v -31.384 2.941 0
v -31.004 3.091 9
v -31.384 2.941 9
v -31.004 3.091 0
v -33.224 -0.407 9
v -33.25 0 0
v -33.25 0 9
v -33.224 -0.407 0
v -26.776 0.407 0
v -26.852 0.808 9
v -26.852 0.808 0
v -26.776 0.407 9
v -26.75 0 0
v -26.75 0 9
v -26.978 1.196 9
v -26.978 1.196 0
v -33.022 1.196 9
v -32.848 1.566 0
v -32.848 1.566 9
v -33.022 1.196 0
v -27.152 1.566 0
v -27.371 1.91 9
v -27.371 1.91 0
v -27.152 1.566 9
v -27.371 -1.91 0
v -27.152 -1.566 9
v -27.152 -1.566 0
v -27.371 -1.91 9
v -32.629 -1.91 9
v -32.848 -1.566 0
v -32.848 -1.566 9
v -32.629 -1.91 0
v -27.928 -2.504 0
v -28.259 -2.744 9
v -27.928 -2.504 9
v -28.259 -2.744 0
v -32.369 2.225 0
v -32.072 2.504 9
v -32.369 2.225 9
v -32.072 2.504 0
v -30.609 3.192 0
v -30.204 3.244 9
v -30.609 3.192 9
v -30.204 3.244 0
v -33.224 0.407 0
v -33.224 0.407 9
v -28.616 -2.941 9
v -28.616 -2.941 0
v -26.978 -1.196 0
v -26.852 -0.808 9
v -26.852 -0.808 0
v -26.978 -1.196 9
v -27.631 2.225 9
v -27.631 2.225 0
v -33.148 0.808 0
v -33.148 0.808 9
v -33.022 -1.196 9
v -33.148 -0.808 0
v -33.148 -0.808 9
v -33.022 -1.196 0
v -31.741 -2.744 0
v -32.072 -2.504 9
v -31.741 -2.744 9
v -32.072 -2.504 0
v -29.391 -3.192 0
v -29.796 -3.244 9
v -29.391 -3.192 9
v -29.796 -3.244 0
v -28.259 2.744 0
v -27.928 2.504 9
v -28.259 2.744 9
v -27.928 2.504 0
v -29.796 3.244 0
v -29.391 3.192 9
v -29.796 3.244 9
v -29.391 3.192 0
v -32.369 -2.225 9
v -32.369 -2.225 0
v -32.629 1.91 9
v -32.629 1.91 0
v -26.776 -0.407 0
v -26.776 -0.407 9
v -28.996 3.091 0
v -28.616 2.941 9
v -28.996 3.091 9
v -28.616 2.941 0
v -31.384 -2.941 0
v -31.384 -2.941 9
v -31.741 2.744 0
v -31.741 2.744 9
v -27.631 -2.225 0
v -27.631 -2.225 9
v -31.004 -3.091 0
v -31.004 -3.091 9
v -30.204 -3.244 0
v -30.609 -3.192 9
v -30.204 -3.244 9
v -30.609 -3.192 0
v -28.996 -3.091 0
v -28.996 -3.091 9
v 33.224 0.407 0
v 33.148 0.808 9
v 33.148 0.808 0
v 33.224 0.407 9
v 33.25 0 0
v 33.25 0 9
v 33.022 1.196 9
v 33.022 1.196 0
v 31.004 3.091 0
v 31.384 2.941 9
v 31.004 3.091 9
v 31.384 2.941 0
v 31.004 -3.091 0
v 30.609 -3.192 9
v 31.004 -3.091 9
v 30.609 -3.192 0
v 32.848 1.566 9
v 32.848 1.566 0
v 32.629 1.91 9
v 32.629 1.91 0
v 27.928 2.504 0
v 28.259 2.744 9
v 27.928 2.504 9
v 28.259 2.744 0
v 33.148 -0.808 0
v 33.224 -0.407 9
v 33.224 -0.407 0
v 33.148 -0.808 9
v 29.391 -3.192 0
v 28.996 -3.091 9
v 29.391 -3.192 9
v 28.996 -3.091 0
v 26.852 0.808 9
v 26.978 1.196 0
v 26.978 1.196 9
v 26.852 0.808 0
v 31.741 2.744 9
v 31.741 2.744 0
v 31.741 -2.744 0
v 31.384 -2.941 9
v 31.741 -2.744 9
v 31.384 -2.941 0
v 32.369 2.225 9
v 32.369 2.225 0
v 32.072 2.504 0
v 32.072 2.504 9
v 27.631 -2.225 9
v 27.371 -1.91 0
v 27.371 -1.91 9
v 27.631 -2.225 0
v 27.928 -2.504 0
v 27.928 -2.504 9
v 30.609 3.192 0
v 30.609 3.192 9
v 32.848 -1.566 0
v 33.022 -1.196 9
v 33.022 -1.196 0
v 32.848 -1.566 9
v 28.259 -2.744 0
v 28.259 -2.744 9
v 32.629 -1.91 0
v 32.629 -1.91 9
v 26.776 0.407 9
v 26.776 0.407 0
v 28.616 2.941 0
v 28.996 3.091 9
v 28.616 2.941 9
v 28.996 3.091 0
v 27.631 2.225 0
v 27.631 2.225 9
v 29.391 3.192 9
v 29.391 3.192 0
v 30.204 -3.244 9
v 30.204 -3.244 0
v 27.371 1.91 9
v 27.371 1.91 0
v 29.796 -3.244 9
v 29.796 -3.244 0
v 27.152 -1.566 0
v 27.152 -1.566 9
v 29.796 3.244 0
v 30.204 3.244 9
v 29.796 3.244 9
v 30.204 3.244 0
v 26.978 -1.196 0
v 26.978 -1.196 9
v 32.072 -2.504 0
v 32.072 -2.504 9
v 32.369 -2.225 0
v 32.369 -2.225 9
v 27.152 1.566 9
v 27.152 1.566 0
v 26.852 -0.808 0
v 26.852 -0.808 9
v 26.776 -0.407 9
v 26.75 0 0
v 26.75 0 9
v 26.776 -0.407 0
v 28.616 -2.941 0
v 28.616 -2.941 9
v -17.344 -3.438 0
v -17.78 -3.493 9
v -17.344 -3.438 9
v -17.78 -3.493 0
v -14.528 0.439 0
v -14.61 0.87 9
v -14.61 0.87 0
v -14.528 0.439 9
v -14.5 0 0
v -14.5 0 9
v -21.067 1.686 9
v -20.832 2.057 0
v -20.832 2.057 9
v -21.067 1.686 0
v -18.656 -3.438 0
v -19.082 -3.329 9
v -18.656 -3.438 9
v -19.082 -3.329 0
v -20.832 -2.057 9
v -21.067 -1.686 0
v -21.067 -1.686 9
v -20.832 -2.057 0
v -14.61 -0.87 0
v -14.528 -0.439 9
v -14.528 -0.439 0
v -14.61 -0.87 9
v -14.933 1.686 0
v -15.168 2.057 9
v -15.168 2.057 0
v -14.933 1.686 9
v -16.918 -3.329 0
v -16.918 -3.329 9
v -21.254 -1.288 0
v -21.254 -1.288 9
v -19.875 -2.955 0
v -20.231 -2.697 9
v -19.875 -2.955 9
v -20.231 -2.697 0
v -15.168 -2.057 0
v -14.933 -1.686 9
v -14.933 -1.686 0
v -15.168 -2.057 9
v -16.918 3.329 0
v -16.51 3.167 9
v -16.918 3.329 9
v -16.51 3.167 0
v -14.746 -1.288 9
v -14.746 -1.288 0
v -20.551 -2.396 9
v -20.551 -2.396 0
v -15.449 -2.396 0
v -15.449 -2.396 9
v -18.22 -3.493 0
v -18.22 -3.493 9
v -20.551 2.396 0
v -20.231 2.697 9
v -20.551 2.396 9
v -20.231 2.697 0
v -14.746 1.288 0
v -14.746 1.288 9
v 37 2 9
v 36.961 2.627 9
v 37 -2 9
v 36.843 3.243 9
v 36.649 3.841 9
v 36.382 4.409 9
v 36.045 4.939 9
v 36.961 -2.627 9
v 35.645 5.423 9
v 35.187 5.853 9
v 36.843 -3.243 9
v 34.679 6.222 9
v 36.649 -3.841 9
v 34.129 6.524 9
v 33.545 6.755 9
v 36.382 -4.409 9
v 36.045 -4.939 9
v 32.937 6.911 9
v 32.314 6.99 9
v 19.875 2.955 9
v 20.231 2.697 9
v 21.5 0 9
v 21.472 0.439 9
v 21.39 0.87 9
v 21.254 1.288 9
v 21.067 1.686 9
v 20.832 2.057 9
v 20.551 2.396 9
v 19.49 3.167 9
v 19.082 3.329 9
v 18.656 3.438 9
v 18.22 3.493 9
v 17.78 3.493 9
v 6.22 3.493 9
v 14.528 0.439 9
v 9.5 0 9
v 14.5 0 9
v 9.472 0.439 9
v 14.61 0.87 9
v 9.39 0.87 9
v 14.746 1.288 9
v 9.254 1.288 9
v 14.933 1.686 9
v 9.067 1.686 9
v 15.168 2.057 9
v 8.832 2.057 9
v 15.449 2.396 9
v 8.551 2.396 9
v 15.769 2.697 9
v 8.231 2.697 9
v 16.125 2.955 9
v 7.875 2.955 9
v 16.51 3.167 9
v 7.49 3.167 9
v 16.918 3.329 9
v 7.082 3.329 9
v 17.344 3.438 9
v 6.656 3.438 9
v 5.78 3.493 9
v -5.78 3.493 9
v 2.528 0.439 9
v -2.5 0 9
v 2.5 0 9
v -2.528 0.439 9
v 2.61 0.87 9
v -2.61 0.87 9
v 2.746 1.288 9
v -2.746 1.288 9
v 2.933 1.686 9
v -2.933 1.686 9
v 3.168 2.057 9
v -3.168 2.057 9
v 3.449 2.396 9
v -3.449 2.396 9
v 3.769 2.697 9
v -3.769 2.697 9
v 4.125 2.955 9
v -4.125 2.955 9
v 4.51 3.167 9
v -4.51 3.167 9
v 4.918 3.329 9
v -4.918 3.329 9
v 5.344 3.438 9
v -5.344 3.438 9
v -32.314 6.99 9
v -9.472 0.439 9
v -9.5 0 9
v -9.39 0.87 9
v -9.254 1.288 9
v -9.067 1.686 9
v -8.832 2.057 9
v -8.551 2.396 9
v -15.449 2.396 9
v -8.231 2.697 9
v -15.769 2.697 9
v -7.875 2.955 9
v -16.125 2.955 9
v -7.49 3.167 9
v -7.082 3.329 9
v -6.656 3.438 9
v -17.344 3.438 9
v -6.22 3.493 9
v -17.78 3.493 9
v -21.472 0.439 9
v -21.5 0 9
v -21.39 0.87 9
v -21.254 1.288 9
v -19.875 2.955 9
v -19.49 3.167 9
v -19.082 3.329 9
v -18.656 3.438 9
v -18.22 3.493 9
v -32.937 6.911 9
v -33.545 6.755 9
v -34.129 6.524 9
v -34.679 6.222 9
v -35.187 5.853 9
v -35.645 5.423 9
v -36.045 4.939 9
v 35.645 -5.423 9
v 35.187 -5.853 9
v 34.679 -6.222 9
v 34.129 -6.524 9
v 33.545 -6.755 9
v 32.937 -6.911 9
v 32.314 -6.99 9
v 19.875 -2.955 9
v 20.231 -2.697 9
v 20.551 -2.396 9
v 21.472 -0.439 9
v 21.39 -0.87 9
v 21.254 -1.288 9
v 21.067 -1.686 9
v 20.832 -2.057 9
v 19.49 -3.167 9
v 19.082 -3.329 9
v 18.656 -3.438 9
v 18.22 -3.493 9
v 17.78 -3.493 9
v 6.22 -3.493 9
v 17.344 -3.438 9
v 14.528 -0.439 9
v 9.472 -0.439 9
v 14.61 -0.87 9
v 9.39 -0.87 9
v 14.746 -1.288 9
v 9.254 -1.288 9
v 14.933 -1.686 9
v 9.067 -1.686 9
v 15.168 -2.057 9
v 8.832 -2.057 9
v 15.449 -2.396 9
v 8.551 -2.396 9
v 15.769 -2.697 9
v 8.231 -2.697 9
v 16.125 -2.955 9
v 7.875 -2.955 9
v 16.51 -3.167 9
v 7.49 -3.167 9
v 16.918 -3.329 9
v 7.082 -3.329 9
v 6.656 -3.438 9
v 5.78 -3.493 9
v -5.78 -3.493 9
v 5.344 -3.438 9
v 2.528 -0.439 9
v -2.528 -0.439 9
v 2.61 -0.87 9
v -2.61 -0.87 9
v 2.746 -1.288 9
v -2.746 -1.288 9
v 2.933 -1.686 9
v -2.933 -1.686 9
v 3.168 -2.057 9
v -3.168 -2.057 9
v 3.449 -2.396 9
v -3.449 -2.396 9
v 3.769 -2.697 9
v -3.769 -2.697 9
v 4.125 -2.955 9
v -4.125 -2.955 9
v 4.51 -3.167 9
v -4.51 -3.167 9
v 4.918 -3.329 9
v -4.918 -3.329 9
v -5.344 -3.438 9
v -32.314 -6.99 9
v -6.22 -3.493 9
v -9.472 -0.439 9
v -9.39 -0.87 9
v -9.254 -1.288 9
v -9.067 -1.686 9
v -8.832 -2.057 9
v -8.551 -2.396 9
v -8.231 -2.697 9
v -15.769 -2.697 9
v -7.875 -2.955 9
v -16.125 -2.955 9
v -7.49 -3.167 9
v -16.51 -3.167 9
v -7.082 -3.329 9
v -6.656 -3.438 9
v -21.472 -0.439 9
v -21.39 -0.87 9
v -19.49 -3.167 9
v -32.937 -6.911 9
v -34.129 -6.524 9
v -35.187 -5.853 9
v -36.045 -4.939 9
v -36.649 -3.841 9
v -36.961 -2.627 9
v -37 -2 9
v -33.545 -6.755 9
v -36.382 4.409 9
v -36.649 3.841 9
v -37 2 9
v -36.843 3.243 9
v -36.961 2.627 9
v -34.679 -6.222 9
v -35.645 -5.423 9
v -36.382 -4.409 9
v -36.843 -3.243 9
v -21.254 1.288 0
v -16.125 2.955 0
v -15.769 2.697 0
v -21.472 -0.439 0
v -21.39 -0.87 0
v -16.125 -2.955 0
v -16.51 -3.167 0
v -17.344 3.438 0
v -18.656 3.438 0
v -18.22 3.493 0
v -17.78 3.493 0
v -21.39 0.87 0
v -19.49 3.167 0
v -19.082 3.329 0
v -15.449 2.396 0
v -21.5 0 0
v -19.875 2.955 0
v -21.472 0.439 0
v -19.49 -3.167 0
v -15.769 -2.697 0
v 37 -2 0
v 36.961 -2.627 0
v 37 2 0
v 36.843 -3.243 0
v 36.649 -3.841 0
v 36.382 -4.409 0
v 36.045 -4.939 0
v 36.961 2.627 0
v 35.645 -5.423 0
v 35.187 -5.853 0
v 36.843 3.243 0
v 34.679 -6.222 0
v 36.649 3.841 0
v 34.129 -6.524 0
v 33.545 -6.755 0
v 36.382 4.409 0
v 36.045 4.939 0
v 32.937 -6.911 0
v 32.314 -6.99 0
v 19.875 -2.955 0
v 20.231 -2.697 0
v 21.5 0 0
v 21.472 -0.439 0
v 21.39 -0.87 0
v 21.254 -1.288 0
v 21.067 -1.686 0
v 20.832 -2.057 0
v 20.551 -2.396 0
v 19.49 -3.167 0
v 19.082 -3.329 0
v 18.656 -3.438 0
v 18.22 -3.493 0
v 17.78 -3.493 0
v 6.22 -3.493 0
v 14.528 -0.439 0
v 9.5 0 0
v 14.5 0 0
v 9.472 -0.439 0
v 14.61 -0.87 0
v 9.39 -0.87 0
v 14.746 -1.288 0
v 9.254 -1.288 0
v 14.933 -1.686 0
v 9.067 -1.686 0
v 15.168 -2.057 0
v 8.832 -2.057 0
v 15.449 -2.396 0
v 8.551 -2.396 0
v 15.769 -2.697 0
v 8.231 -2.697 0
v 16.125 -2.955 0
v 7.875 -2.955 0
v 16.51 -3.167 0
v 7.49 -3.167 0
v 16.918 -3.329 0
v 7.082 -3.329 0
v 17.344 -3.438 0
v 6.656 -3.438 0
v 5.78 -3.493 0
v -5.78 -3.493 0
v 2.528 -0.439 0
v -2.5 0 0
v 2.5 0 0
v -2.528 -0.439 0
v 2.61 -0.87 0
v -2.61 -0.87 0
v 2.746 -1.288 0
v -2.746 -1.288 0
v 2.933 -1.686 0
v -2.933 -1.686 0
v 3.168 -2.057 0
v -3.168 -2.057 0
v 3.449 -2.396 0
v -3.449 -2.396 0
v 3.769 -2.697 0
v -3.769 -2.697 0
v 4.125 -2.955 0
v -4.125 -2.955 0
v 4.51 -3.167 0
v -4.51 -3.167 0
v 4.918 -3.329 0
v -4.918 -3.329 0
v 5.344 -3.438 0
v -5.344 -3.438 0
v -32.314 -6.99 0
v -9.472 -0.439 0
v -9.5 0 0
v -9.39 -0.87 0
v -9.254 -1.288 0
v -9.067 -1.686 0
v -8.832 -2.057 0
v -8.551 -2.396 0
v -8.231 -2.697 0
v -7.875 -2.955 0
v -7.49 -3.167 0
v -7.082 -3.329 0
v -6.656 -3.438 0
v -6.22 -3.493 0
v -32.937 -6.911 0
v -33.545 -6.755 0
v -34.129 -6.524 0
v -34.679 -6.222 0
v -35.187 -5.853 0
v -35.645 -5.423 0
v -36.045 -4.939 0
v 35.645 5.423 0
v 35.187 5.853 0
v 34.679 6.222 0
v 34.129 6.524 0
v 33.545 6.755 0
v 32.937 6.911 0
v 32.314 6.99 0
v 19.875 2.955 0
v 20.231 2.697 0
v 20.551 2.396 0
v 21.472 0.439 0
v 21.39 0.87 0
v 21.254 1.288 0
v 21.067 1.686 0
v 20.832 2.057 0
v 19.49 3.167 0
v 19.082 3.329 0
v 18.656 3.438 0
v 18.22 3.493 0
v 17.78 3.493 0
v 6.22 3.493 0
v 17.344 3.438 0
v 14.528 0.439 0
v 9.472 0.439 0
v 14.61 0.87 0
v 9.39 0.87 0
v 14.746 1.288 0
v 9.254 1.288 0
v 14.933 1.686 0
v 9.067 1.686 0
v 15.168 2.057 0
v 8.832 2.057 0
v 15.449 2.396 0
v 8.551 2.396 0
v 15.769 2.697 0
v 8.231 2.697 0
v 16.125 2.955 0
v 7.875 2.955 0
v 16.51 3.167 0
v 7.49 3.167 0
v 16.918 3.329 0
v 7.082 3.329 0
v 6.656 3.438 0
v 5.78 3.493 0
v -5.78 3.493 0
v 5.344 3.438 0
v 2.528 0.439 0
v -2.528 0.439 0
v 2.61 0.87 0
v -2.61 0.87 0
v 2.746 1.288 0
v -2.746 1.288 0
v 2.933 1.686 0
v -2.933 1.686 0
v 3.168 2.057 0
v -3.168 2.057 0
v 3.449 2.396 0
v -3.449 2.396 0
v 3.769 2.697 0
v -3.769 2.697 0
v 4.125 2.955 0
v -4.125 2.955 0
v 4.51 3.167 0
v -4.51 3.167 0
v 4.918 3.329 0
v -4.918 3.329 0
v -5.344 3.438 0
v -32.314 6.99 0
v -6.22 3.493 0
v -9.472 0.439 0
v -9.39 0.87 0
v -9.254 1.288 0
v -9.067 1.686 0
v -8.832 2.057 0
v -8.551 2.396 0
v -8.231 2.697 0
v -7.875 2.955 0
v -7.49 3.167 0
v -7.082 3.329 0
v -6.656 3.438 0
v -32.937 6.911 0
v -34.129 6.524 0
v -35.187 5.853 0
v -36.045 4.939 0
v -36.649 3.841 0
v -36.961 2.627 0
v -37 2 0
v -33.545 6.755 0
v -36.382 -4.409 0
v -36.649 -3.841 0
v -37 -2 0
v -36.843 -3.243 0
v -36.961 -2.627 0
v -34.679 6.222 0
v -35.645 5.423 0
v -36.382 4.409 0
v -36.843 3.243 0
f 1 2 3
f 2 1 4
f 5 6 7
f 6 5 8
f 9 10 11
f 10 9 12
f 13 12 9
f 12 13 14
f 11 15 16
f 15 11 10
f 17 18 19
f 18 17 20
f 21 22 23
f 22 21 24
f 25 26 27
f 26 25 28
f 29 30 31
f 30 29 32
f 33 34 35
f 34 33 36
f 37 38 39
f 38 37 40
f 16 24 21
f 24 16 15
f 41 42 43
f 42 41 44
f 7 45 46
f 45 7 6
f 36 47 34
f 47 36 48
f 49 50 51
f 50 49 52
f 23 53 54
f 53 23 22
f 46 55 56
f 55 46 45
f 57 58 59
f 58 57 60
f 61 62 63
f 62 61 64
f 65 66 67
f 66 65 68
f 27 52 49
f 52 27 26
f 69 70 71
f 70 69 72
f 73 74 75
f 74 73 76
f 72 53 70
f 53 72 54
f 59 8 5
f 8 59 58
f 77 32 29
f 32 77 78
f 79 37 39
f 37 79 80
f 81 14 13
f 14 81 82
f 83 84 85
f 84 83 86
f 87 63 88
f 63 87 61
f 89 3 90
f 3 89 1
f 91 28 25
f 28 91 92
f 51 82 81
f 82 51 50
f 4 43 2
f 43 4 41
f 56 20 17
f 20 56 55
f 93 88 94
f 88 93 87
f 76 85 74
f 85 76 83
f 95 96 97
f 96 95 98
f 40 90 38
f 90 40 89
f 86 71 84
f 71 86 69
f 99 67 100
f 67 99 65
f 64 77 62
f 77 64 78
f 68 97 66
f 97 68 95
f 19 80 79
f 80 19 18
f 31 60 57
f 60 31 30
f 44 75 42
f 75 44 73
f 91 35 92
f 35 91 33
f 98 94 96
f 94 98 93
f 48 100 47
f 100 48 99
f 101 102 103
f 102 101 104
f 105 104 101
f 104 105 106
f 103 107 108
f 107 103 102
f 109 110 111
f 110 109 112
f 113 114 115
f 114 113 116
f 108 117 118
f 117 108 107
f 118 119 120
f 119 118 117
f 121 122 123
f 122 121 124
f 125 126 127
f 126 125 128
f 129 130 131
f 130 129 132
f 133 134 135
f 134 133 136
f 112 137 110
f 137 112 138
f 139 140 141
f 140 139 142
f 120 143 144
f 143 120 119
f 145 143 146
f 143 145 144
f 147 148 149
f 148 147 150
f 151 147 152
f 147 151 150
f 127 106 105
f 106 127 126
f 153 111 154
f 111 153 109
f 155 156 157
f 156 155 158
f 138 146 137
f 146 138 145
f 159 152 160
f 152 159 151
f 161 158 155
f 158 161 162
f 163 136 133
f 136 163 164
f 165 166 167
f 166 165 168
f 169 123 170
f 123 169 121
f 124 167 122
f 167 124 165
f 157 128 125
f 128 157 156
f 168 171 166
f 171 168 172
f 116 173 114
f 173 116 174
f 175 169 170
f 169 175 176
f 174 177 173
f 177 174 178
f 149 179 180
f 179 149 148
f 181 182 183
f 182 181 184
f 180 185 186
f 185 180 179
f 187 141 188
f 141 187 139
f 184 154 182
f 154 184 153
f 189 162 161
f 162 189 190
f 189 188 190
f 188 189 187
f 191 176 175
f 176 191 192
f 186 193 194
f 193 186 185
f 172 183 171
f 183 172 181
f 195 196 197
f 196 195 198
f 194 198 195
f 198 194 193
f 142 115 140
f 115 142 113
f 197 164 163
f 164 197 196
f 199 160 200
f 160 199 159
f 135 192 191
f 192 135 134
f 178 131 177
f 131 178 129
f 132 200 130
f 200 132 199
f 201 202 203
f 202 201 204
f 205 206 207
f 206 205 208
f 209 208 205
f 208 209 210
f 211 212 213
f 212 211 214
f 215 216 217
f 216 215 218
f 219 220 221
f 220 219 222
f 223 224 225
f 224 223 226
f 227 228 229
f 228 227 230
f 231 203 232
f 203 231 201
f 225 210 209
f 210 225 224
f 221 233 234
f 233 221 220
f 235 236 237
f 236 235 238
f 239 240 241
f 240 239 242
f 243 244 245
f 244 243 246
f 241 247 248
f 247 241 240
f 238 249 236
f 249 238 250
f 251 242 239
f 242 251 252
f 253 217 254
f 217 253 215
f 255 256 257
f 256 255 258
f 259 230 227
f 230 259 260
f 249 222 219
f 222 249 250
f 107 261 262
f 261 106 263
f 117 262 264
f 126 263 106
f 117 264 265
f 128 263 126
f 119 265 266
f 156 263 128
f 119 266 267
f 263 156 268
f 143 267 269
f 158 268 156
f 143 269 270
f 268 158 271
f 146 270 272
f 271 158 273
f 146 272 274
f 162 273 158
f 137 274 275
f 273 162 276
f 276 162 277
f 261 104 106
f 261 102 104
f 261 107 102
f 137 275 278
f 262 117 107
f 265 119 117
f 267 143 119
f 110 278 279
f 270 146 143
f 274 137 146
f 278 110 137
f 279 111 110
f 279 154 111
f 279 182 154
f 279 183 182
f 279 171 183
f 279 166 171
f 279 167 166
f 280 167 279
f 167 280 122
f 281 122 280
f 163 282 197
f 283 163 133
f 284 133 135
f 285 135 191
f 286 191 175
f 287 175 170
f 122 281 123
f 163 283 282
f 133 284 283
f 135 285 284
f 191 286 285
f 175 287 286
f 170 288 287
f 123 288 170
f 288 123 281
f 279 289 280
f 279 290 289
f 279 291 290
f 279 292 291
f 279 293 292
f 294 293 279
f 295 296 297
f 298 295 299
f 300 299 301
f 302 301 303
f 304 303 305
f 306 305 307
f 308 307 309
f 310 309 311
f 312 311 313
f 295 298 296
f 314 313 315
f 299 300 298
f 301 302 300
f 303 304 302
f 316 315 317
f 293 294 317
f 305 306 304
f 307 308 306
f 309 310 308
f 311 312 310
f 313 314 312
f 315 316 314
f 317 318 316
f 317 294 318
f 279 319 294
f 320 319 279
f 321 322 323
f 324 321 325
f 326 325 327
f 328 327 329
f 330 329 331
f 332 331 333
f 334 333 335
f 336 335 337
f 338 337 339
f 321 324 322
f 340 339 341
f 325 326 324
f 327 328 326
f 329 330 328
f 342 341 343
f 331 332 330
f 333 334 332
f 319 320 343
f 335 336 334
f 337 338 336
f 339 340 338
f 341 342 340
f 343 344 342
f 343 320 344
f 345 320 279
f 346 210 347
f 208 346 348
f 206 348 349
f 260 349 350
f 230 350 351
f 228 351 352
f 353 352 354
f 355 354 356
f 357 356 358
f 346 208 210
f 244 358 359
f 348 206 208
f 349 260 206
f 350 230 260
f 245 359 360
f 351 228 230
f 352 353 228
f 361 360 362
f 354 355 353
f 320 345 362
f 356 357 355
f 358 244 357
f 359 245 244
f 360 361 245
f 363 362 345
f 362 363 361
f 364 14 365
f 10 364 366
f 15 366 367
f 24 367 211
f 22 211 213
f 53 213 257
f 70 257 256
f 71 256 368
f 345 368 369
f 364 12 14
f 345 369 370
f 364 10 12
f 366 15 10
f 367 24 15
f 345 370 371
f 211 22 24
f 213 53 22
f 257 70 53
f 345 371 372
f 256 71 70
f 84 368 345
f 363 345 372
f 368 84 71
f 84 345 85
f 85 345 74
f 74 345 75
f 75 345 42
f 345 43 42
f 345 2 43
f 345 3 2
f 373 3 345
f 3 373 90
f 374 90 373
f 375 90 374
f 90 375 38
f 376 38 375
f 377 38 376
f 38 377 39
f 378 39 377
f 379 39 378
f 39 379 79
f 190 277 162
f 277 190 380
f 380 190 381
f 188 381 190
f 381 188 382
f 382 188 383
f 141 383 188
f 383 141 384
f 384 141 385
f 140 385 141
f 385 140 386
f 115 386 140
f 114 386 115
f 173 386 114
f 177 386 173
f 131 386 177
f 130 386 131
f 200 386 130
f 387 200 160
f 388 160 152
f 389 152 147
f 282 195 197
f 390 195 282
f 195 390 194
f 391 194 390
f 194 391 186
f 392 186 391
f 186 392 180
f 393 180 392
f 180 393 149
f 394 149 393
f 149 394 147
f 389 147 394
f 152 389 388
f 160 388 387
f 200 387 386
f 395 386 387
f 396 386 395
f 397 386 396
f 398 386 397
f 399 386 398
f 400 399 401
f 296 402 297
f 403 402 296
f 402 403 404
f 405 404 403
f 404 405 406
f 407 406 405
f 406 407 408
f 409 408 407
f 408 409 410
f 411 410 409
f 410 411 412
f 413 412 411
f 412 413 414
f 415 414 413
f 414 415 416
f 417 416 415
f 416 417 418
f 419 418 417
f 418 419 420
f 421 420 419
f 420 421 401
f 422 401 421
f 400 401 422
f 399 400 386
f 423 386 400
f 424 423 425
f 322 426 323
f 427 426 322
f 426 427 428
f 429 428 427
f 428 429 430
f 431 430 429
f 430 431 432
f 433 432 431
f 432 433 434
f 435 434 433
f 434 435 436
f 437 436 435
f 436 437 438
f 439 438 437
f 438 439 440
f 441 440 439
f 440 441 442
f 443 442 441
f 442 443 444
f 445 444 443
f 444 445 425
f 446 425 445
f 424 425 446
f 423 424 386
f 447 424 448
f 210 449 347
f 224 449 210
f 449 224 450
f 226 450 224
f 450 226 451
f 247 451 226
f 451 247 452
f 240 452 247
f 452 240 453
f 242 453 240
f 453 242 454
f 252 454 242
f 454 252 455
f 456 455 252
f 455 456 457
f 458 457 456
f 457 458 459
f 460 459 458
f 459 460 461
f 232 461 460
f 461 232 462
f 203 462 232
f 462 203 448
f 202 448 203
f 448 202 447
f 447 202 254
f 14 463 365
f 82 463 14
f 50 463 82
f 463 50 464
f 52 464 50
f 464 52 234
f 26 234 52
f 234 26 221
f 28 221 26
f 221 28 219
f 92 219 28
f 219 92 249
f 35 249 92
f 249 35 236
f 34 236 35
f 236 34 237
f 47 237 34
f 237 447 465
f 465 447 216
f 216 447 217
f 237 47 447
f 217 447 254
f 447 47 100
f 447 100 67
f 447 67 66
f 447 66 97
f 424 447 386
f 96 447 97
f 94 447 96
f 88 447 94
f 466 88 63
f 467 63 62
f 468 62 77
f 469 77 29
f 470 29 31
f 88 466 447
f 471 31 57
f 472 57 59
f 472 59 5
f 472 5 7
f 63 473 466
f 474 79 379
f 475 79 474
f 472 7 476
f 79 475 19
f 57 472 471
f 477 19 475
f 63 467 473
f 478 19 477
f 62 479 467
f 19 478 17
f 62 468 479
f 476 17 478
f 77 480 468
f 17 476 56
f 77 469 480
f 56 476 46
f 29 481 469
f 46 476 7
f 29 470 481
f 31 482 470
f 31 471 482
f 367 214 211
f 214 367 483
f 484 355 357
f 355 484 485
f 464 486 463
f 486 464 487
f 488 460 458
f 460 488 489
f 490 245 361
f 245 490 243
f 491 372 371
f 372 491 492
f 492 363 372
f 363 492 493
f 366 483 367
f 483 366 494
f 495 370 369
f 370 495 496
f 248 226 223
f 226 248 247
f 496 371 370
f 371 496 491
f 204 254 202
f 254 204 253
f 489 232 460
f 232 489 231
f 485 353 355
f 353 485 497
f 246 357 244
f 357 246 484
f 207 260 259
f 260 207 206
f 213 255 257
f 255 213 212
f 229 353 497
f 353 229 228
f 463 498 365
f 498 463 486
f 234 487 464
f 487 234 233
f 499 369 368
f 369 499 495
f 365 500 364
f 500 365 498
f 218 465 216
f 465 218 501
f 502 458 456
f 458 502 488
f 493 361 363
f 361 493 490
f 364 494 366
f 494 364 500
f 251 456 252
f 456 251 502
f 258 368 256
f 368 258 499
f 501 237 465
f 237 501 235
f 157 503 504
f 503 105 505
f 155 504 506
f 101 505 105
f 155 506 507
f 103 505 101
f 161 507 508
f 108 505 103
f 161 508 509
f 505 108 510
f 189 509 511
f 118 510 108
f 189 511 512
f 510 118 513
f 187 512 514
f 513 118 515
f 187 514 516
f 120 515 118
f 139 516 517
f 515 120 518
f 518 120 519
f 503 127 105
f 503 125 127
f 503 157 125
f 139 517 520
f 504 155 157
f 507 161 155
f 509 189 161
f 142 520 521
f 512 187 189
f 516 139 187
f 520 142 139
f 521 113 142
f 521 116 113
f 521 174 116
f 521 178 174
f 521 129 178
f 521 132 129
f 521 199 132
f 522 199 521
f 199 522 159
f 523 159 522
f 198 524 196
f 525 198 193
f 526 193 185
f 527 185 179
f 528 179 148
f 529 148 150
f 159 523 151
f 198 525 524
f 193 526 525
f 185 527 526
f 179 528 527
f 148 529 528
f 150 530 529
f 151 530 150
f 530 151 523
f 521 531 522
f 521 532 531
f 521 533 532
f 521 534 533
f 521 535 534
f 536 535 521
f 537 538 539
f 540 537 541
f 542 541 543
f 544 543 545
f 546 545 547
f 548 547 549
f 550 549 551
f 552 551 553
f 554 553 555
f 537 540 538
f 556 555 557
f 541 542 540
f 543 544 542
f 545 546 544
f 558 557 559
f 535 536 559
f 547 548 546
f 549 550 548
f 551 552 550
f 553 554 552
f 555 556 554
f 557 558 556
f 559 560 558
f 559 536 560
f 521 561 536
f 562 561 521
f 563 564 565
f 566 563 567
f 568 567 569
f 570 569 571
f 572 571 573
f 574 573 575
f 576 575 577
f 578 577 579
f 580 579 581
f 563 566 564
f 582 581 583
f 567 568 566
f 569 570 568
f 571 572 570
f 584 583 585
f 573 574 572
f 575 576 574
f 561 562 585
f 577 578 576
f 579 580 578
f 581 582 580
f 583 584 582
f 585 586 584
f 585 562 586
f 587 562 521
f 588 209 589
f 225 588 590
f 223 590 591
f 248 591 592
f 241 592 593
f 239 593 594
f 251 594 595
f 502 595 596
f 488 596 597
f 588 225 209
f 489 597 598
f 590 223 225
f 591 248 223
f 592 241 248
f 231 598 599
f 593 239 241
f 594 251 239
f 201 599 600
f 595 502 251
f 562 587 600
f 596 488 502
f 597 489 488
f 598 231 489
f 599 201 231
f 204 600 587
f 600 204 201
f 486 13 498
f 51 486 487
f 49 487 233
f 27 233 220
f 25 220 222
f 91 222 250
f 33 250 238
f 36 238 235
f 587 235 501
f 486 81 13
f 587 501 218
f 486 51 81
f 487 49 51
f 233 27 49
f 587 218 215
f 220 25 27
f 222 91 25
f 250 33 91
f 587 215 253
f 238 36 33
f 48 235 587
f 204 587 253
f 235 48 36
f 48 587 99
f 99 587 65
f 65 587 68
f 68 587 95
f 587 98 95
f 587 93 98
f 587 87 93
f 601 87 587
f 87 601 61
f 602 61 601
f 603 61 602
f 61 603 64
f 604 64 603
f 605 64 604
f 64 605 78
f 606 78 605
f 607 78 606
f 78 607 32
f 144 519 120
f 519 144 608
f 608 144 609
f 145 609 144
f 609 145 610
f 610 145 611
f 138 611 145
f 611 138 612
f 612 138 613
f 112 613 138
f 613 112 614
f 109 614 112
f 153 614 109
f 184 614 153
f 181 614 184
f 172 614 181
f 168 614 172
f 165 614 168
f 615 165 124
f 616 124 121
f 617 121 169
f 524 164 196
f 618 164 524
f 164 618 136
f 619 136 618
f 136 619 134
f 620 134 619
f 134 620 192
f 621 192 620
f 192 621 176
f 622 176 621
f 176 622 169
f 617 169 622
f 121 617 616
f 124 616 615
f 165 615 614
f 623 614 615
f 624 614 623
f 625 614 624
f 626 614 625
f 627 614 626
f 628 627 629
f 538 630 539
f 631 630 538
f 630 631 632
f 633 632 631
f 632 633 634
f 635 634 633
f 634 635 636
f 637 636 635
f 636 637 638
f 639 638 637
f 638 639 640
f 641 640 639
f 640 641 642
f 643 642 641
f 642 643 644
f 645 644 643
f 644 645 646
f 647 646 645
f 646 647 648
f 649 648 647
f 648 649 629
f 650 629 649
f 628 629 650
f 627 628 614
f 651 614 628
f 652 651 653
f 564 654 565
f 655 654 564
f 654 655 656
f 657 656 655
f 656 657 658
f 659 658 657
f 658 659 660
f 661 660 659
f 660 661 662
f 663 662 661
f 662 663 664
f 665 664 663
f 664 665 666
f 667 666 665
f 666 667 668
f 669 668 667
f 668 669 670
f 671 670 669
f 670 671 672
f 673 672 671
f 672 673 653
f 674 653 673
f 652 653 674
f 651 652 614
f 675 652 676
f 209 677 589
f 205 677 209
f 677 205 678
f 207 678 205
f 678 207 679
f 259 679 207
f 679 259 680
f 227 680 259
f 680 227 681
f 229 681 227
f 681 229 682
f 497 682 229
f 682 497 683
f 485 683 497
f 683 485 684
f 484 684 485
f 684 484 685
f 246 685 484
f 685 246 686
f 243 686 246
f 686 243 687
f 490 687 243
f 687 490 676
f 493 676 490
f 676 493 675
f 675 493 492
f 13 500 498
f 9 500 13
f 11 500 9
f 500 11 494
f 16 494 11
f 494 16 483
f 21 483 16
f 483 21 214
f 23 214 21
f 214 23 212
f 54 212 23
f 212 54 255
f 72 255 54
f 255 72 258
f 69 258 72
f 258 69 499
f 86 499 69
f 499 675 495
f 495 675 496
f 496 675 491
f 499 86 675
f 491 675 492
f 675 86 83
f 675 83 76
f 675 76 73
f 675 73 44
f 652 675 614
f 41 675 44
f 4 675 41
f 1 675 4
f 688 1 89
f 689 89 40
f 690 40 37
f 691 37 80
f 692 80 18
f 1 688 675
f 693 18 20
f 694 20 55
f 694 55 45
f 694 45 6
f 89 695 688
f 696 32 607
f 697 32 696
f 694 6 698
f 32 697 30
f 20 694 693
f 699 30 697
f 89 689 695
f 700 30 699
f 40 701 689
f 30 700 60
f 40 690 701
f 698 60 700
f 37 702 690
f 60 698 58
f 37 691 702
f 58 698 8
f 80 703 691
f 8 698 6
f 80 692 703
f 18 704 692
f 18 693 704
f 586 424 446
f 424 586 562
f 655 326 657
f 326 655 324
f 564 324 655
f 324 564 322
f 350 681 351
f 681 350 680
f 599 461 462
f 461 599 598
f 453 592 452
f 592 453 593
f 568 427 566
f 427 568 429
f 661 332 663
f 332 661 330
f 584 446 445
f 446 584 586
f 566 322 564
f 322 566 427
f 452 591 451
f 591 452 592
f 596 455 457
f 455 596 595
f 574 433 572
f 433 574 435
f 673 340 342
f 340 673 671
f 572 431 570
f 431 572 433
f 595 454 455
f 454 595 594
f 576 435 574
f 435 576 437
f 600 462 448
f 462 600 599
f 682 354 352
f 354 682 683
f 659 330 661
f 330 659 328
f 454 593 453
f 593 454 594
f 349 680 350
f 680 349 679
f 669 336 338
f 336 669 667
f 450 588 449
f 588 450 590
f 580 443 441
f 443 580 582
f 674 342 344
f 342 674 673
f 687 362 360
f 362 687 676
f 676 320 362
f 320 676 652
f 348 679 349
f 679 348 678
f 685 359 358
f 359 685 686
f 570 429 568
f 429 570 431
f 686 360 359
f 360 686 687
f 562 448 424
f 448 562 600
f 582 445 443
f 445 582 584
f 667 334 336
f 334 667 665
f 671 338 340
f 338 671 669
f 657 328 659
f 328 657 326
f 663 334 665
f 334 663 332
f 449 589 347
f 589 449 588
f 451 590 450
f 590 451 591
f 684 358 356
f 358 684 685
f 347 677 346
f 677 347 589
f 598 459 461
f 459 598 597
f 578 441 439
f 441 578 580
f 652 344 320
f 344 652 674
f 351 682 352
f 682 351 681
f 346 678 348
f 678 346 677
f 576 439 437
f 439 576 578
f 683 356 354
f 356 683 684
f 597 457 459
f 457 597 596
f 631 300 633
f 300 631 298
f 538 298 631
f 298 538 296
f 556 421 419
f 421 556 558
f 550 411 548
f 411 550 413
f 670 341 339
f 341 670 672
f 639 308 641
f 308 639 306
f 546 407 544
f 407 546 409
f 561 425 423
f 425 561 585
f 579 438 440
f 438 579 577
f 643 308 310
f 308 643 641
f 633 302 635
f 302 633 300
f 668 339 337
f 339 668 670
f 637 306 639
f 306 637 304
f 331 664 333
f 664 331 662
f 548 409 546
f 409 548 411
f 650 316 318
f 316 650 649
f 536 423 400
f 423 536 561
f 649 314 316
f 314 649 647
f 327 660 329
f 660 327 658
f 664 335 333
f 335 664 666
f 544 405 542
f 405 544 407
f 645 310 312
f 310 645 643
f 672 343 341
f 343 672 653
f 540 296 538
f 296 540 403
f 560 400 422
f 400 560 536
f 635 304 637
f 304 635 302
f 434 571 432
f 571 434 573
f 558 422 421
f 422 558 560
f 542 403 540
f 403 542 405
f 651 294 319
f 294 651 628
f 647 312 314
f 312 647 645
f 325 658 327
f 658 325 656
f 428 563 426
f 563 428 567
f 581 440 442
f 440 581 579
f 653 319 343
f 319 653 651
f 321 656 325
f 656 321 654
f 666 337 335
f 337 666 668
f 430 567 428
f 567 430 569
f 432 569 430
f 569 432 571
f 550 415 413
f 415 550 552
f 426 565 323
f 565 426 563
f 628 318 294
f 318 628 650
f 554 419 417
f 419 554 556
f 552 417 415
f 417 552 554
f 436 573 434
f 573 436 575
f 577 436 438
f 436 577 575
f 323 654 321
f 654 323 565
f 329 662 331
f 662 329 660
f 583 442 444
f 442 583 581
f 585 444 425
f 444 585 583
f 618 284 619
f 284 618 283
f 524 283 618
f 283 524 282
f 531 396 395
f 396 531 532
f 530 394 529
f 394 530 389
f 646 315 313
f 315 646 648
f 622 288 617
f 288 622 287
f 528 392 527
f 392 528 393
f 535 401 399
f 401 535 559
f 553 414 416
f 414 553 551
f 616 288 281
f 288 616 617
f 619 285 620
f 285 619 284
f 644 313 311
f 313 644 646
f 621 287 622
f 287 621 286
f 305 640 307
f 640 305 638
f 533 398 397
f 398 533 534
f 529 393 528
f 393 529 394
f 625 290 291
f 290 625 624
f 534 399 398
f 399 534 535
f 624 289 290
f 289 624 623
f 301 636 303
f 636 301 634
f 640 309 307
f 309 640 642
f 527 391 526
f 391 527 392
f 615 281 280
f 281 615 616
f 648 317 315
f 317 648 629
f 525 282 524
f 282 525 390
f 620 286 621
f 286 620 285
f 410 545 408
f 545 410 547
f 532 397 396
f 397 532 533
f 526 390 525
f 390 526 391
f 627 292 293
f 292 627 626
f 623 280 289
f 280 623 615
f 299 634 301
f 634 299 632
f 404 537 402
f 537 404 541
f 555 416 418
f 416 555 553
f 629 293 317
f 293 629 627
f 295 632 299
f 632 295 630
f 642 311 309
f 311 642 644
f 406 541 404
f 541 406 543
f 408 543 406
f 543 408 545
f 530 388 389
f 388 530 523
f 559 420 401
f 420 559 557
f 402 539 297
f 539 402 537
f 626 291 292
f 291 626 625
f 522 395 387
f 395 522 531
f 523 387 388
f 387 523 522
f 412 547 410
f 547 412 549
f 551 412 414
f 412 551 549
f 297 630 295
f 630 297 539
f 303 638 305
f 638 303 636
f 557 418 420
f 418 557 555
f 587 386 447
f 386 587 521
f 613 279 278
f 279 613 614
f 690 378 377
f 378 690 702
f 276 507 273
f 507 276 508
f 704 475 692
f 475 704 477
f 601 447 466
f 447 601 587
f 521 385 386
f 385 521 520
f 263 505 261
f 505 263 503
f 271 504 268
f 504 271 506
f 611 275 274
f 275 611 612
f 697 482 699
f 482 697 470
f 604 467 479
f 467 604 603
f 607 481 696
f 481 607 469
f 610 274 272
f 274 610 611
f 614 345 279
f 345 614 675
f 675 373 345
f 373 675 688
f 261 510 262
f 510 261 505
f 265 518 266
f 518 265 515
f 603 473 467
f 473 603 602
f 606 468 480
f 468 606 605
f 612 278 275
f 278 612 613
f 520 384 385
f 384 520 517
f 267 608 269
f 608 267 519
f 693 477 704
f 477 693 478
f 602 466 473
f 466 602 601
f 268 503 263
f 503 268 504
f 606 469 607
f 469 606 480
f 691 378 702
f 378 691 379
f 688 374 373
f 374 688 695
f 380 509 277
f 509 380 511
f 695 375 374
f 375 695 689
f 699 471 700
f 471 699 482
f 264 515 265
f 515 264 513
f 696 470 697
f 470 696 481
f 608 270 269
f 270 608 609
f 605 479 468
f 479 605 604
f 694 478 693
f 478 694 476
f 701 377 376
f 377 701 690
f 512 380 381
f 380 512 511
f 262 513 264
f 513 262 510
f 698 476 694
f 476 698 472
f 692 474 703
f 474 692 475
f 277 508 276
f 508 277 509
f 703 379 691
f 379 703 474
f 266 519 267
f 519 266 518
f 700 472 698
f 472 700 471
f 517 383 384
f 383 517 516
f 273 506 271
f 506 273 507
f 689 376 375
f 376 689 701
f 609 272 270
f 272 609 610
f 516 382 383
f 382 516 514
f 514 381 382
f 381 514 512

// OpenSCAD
$fn = 50;


difference() {
	union() {
		hull() {
			translate(v = [-32.0000000000, 2.0000000000, 0]) {
				cylinder(h = 9, r = 5);
			}
			translate(v = [32.0000000000, 2.0000000000, 0]) {
				cylinder(h = 9, r = 5);
			}
			translate(v = [-32.0000000000, -2.0000000000, 0]) {
				cylinder(h = 9, r = 5);
			}
			translate(v = [32.0000000000, -2.0000000000, 0]) {
				cylinder(h = 9, r = 5);
			}
		}
	}
	union() {
		#translate(v = [-30.0000000000, 0.0000000000, 0]) {
			cylinder(h = 9, r = 3.2500000000);
		}
		#translate(v = [30.0000000000, 0.0000000000, 0]) {
			cylinder(h = 9, r = 3.2500000000);
		}
		#translate(v = [-30.0000000000, 0.0000000000, -100.0000000000]) {
			cylinder(h = 200, r = 3.2500000000);
		}
		#translate(v = [-30.0000000000, 0.0000000000, -100.0000000000]) {
			cylinder(h = 200, r = 3.2500000000);
		}
		#translate(v = [30.0000000000, 0.0000000000, -100.0000000000]) {
			cylinder(h = 200, r = 3.2500000000);
		}
		#translate(v = [30.0000000000, 0.0000000000, -100.0000000000]) {
			cylinder(h = 200, r = 3.2500000000);
		}
		#translate(v = [-30.0000000000, 0.0000000000, 0]) {
			cylinder(h = 9, r = 1.8000000000);
		}
		#translate(v = [30.0000000000, 0.0000000000, 0]) {
			cylinder(h = 9, r = 1.8000000000);
		}
		#translate(v = [-30.0000000000, 0.0000000000, 0]) {
			cylinder(h = 9, r = 1.8000000000);
		}
		#translate(v = [30.0000000000, 0.0000000000, 0]) {
			cylinder(h = 9, r = 1.8000000000);
		}
		#translate(v = [-30.0000000000, 0.0000000000, 0]) {
			cylinder(h = 9, r = 1.8000000000);
		}
		#translate(v = [30.0000000000, 0.0000000000, 0]) {
			cylinder(h = 9, r = 1.8000000000);
		}
		#translate(v = [-18.0000000000, 0, 0]) {
			cylinder(h = 9, r = 3.5000000000);
		}
		#translate(v = [-6.0000000000, 0, 0]) {
			cylinder(h = 9, r = 3.5000000000);
		}
		#translate(v = [6.0000000000, 0, 0]) {
			cylinder(h = 9, r = 3.5000000000);
		}
		#translate(v = [18.0000000000, 0, 0]) {
			cylinder(h = 9, r = 3.5000000000);
		}
	}
}
